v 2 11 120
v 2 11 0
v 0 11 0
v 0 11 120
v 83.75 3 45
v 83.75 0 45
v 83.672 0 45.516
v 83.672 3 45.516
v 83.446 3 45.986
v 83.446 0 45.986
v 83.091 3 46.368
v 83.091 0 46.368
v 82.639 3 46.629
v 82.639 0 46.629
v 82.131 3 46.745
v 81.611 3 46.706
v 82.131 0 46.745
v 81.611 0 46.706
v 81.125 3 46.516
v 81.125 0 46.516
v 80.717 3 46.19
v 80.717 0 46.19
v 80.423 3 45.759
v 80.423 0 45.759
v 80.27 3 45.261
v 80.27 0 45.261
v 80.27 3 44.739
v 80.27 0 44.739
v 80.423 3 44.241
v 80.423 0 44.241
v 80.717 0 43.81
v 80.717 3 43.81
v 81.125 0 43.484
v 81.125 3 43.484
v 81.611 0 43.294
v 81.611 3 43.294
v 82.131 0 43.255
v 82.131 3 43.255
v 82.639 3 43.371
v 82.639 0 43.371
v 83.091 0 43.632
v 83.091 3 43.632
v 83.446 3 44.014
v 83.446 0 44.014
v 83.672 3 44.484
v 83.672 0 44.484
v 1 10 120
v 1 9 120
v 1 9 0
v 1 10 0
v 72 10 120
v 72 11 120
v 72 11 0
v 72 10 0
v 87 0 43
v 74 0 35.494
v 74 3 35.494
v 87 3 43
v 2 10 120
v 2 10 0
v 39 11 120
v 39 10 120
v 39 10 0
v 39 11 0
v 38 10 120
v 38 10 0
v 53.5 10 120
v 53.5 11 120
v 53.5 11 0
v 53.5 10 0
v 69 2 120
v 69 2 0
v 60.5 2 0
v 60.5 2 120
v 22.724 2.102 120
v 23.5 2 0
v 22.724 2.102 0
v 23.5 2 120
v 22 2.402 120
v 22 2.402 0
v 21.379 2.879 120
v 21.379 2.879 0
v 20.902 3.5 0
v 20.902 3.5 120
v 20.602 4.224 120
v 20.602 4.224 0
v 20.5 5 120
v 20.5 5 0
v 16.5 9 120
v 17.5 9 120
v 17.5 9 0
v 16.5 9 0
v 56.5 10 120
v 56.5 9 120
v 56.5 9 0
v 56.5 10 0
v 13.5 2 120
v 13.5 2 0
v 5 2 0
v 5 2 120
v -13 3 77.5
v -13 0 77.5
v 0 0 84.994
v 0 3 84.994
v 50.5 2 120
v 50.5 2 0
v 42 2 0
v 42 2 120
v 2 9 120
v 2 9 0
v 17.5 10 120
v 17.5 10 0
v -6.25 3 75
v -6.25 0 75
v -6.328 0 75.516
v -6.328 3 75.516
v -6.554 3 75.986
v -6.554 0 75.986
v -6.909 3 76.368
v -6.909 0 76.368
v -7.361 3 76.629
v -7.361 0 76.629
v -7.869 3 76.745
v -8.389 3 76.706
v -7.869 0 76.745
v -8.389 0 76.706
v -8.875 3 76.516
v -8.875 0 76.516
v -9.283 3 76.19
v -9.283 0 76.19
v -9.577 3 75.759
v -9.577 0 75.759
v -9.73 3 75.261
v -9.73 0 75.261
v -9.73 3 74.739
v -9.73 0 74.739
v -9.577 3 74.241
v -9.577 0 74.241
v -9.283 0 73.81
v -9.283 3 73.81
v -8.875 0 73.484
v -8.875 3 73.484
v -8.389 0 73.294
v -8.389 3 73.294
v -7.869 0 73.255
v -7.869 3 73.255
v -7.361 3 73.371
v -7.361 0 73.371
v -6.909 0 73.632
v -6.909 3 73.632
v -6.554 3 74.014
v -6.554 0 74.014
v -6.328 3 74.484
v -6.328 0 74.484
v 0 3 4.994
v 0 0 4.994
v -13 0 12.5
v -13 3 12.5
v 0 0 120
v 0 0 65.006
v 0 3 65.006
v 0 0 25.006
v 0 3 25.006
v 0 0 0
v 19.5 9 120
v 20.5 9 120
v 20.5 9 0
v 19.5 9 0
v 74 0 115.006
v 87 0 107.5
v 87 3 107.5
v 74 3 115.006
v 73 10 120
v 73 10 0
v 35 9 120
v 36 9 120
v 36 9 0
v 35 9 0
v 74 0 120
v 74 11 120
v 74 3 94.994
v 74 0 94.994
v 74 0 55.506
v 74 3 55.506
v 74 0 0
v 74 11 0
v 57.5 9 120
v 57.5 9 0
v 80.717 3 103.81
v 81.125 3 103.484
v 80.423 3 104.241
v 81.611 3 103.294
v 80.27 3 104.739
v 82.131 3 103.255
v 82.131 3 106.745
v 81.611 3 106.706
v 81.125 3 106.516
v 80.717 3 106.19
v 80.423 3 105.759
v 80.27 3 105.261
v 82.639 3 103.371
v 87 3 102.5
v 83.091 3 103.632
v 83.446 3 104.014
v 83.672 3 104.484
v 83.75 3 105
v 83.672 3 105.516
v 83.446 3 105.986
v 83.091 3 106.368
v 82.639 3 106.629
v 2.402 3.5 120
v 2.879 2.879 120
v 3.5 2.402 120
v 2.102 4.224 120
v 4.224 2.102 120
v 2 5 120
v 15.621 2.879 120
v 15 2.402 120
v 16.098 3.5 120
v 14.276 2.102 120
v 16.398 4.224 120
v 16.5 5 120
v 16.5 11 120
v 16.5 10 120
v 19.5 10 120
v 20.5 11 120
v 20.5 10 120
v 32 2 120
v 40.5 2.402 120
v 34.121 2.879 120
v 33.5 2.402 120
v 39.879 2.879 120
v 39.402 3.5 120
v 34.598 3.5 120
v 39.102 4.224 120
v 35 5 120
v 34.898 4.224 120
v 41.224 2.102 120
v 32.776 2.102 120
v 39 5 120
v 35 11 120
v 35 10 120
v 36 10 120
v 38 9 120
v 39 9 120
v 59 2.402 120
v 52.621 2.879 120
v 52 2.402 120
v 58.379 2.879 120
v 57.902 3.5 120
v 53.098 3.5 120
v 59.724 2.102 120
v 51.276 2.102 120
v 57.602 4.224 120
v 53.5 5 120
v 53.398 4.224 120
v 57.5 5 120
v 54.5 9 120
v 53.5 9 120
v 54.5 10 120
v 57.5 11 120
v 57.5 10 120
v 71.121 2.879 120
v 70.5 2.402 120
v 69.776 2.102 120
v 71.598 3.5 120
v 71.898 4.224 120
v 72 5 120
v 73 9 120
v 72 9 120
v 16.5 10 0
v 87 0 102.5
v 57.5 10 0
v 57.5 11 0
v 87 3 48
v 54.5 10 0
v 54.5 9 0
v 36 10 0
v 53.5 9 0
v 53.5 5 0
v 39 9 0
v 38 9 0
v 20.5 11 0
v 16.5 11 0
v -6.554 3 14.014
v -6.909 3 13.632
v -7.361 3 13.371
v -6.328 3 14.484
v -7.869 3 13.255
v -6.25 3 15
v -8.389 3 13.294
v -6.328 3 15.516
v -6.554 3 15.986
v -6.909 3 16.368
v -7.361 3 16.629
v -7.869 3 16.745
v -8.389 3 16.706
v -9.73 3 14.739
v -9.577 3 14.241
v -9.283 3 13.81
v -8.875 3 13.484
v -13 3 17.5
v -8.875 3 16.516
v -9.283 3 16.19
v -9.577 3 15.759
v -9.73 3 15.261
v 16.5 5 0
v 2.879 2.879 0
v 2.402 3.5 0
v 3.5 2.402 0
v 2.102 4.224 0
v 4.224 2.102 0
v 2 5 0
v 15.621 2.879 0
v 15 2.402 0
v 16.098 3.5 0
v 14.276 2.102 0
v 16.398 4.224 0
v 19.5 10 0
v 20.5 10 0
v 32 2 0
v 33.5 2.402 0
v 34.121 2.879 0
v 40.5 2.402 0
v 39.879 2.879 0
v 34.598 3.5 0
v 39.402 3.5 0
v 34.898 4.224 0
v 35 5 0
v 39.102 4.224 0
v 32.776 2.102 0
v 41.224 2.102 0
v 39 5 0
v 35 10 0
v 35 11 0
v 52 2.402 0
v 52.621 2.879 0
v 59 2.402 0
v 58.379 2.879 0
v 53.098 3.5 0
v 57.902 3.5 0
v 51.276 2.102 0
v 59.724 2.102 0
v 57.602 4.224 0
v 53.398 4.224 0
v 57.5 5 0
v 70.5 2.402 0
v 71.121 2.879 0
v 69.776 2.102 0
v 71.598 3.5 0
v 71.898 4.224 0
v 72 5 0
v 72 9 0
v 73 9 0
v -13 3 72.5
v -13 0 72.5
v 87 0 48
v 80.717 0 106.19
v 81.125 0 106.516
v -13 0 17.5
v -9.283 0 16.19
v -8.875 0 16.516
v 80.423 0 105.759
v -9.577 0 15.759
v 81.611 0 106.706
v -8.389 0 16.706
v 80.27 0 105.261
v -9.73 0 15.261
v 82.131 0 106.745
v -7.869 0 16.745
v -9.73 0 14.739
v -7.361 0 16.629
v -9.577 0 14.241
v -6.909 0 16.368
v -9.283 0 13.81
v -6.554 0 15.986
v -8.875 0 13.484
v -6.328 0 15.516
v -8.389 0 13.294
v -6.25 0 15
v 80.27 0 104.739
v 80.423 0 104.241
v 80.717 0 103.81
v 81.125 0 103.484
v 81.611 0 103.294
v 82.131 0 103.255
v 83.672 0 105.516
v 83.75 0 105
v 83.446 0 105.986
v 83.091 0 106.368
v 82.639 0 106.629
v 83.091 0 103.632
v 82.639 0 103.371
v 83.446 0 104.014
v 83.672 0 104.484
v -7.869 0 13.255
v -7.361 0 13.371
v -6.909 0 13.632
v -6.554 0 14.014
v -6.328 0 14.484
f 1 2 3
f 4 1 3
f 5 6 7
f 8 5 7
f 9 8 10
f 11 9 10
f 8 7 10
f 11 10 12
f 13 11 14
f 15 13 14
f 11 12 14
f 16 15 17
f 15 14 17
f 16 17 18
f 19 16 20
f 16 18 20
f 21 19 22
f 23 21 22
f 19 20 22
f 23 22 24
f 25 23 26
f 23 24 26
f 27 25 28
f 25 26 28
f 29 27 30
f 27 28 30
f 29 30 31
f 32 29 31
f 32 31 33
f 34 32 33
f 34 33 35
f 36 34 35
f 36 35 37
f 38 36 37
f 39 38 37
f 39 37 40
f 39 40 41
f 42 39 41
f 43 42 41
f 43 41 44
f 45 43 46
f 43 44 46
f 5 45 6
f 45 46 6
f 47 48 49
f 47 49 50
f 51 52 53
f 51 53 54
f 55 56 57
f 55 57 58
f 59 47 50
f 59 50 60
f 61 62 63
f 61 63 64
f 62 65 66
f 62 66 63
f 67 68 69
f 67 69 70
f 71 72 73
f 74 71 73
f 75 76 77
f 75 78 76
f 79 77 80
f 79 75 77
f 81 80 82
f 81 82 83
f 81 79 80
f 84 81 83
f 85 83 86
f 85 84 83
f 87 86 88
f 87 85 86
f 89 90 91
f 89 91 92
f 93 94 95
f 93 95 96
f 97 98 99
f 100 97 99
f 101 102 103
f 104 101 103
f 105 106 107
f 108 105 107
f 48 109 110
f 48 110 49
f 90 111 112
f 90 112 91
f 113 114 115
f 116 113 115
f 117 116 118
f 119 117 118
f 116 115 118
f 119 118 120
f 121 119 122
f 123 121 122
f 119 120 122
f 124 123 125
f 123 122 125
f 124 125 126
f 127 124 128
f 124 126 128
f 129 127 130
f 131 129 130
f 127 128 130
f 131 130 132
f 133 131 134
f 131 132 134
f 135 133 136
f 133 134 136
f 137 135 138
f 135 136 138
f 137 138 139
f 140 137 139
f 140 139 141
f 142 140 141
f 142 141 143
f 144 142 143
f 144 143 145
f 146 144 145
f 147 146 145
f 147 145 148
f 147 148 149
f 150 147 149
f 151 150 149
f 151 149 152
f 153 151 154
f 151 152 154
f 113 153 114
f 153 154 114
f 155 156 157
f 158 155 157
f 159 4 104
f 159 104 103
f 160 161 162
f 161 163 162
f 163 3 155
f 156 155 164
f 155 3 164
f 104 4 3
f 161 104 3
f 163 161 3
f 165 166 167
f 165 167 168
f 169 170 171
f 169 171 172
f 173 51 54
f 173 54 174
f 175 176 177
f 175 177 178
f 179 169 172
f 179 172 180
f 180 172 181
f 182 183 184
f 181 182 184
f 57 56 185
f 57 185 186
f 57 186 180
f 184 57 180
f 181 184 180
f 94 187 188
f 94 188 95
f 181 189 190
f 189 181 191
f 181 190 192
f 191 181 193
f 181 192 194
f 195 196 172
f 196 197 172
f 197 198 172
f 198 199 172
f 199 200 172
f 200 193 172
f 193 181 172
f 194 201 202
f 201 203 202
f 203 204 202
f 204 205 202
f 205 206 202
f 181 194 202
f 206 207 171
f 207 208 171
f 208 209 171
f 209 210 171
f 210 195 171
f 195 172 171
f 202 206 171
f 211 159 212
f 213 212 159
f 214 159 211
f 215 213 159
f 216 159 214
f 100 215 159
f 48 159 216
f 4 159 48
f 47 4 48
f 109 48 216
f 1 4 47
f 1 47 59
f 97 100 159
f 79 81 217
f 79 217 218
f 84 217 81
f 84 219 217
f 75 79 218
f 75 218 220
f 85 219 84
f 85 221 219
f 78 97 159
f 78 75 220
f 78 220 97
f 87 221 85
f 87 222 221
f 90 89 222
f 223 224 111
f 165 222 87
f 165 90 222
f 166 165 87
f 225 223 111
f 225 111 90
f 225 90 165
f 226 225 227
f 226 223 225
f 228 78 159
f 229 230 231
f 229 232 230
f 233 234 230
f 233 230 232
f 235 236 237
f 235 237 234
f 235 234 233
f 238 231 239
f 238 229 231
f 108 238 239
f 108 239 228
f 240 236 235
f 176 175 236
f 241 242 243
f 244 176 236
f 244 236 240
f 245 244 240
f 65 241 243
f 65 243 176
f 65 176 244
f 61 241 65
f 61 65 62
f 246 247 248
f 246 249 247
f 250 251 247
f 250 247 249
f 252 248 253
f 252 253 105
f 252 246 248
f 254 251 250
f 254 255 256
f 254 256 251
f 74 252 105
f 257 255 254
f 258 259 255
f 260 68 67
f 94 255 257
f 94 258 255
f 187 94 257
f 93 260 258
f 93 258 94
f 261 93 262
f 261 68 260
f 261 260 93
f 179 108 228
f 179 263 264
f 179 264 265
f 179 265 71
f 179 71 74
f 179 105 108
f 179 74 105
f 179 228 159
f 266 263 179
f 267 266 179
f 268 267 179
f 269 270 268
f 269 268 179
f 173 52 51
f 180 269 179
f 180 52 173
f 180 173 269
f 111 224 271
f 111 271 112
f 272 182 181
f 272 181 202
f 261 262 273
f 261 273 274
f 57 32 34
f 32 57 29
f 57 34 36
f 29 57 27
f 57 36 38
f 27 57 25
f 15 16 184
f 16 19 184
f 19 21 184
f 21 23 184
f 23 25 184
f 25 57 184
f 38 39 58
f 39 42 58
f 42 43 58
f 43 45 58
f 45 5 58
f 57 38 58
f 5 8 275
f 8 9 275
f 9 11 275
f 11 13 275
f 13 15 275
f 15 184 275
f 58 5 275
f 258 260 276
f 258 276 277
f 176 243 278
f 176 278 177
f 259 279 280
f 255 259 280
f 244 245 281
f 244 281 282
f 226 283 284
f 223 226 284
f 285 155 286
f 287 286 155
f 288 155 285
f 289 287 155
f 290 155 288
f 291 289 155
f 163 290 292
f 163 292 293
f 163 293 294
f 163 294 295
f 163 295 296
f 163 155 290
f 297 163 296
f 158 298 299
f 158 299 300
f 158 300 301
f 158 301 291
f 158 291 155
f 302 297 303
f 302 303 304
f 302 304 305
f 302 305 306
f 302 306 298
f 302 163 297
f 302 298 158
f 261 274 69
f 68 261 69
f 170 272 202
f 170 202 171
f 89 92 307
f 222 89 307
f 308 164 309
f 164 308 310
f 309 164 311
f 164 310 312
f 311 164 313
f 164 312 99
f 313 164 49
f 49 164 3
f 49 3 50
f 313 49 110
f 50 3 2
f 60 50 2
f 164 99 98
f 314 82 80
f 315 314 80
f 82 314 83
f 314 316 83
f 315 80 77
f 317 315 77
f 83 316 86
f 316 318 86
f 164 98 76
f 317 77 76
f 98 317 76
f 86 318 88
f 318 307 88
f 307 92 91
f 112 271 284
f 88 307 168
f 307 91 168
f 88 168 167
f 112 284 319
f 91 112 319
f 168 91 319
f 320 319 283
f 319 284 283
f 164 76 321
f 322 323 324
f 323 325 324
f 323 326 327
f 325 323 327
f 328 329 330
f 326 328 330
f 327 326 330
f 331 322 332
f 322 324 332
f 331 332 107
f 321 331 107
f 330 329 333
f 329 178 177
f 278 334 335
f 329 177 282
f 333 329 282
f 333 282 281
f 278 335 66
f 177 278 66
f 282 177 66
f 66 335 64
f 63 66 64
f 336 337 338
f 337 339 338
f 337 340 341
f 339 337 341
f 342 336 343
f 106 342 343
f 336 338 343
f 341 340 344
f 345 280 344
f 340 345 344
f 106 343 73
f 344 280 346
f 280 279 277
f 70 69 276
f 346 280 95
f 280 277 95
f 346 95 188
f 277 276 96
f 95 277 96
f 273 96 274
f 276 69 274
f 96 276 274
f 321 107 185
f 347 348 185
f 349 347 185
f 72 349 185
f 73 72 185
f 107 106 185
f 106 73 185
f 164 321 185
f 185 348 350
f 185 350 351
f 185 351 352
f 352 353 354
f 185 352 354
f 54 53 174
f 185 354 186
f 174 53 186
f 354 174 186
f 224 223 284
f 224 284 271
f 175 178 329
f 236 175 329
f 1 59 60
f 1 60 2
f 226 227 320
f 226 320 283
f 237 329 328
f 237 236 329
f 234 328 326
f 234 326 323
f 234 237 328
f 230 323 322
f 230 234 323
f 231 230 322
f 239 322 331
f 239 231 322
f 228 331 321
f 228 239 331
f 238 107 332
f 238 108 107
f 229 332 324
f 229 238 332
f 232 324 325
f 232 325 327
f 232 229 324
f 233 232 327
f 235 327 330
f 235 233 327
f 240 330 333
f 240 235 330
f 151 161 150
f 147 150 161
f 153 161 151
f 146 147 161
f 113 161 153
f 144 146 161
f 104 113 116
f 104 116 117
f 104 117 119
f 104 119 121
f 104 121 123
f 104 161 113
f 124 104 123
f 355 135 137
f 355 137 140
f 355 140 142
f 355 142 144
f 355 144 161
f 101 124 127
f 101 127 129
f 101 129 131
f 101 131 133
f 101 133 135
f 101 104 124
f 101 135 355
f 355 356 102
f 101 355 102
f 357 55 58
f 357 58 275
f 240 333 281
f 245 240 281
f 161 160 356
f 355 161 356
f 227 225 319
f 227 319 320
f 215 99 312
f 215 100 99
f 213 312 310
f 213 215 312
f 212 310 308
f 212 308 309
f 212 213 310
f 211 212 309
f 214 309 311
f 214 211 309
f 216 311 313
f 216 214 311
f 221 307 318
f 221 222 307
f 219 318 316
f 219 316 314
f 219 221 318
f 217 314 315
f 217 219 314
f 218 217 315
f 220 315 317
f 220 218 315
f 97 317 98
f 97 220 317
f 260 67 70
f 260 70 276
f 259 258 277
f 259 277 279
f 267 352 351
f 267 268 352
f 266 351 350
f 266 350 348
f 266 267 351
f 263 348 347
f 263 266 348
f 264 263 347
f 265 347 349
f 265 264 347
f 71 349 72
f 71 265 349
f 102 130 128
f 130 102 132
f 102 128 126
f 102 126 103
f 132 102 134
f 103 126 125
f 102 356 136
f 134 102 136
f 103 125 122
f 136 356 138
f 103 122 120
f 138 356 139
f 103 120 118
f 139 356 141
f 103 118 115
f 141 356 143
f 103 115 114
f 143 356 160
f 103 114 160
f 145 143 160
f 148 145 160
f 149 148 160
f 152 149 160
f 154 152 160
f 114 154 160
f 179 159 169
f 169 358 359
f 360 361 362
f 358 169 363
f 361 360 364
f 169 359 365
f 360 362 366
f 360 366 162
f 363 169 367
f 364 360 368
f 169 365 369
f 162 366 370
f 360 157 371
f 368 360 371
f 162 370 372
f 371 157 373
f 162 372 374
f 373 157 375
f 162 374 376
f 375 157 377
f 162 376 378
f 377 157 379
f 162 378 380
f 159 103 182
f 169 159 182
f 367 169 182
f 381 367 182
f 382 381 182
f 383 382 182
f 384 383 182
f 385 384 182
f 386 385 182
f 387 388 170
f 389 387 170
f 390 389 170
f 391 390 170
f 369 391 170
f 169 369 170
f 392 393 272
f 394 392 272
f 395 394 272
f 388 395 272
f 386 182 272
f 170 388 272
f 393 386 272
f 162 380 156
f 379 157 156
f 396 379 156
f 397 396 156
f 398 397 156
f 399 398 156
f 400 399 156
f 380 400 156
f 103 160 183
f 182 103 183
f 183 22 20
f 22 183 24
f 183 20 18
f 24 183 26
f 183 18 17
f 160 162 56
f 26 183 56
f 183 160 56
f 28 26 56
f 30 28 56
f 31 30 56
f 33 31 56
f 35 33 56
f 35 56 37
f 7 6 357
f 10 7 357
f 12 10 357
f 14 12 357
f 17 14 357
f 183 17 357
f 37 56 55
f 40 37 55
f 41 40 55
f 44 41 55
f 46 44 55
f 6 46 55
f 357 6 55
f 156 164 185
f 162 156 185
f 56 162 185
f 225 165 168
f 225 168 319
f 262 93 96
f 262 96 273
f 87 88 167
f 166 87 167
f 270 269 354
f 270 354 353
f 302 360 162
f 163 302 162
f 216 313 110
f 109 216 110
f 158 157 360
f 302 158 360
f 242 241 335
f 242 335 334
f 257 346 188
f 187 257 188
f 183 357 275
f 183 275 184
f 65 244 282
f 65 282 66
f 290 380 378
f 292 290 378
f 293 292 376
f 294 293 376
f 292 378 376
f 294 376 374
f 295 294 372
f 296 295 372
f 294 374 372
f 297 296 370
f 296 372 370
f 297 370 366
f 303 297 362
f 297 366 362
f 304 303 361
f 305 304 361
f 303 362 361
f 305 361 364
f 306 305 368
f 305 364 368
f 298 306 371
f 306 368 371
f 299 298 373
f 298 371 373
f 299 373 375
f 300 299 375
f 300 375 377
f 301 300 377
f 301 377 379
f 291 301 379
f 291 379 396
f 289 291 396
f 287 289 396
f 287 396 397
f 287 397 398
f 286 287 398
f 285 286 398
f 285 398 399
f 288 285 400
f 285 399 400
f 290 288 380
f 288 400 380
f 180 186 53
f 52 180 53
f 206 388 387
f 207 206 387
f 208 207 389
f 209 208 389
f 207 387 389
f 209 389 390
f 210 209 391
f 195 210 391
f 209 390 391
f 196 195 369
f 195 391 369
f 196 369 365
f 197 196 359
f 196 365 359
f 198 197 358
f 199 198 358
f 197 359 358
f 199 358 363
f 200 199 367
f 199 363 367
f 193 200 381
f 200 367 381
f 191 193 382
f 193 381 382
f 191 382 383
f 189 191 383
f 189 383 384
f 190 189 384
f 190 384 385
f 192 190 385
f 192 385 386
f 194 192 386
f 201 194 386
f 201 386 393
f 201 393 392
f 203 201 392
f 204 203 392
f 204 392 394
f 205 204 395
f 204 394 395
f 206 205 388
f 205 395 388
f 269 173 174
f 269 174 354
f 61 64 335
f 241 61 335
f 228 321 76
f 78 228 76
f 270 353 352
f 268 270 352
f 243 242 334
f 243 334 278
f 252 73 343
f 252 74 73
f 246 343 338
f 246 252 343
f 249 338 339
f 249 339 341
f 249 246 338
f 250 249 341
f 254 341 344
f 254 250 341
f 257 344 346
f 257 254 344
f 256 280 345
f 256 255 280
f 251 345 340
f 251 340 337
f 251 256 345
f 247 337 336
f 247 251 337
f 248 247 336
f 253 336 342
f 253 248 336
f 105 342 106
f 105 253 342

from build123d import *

# Parameters (mm, degrees)
PAD_DEPTH    = 120
SKETCH001_R  = 1.75
PAD001_DEPTH = 3
FILLET_R     = 3


with BuildPart() as part:
    # Sketch → Pad (new body)
    with BuildSketch(Plane.XY):
        Polygon((0, 0), (74, 0), (74, 11), (72, 11), (72, 10), (73, 10), (73, 9), (72, 9), (72, 2), (57.5, 2), (57.5, 9), (56.5, 9), (56.5, 10), (57.5, 10), (57.5, 11), (53.5, 11), (53.5, 10), (54.5, 10), (54.5, 9), (53.5, 9), (53.5, 2), (39, 2), (39, 9), (38, 9), (38, 10), (39, 10), (39, 11), (35, 11), (35, 10), (36, 10), (36, 9), (35, 9), (35, 2), (20.5, 2), (20.5, 9), (19.5, 9), (19.5, 10), (20.5, 10), (20.5, 11), (16.5, 11), (16.5, 10), (17.5, 10), (17.5, 9), (16.5, 9), (16.5, 2), (2, 2), (2, 9), (1, 9), (1, 10), (2, 10), (2, 11), (0, 11), align=None)
    extrude(amount=PAD_DEPTH)

    # Sketch001 → Pad001 (join)
    with BuildSketch(Plane.XZ):
        Polygon((0, 4.994447), (-13, 12.5), (-13, 17.5), (0, 25.005553), align=None)
        with Locations((-8, 15)):
            Circle(SKETCH001_R, mode=Mode.SUBTRACT)
        Polygon((0, 65.005553), (-13, 72.5), (-13, 77.5), (0, 84.994447), align=None)
        with Locations((-8, 75)):
            Circle(SKETCH001_R, mode=Mode.SUBTRACT)
        Polygon((74, 35.494447), (87, 43), (87, 48), (74, 55.505553), align=None)
        with Locations((82, 45)):
            Circle(SKETCH001_R, mode=Mode.SUBTRACT)
        Polygon((74, 94.994447), (87, 102.5), (87, 107.5), (74, 115.005553), align=None)
        with Locations((82, 105)):
            Circle(SKETCH001_R, mode=Mode.SUBTRACT)
    extrude(amount=-PAD001_DEPTH)

    # Fillet
    fillet_edges = [part.edges().sort_by_distance(p)[0] for p in [
        (39, 2, 60),
        (57.5, 2, 60),
        (72, 2, 60),
        (53.5, 2, 60),
        (2, 2, 60),
        (20.5, 2, 60),
        (16.5, 2, 60),
        (35, 2, 60),
    ]]
    fillet(fillet_edges, radius=FILLET_R)


solid = part.part
